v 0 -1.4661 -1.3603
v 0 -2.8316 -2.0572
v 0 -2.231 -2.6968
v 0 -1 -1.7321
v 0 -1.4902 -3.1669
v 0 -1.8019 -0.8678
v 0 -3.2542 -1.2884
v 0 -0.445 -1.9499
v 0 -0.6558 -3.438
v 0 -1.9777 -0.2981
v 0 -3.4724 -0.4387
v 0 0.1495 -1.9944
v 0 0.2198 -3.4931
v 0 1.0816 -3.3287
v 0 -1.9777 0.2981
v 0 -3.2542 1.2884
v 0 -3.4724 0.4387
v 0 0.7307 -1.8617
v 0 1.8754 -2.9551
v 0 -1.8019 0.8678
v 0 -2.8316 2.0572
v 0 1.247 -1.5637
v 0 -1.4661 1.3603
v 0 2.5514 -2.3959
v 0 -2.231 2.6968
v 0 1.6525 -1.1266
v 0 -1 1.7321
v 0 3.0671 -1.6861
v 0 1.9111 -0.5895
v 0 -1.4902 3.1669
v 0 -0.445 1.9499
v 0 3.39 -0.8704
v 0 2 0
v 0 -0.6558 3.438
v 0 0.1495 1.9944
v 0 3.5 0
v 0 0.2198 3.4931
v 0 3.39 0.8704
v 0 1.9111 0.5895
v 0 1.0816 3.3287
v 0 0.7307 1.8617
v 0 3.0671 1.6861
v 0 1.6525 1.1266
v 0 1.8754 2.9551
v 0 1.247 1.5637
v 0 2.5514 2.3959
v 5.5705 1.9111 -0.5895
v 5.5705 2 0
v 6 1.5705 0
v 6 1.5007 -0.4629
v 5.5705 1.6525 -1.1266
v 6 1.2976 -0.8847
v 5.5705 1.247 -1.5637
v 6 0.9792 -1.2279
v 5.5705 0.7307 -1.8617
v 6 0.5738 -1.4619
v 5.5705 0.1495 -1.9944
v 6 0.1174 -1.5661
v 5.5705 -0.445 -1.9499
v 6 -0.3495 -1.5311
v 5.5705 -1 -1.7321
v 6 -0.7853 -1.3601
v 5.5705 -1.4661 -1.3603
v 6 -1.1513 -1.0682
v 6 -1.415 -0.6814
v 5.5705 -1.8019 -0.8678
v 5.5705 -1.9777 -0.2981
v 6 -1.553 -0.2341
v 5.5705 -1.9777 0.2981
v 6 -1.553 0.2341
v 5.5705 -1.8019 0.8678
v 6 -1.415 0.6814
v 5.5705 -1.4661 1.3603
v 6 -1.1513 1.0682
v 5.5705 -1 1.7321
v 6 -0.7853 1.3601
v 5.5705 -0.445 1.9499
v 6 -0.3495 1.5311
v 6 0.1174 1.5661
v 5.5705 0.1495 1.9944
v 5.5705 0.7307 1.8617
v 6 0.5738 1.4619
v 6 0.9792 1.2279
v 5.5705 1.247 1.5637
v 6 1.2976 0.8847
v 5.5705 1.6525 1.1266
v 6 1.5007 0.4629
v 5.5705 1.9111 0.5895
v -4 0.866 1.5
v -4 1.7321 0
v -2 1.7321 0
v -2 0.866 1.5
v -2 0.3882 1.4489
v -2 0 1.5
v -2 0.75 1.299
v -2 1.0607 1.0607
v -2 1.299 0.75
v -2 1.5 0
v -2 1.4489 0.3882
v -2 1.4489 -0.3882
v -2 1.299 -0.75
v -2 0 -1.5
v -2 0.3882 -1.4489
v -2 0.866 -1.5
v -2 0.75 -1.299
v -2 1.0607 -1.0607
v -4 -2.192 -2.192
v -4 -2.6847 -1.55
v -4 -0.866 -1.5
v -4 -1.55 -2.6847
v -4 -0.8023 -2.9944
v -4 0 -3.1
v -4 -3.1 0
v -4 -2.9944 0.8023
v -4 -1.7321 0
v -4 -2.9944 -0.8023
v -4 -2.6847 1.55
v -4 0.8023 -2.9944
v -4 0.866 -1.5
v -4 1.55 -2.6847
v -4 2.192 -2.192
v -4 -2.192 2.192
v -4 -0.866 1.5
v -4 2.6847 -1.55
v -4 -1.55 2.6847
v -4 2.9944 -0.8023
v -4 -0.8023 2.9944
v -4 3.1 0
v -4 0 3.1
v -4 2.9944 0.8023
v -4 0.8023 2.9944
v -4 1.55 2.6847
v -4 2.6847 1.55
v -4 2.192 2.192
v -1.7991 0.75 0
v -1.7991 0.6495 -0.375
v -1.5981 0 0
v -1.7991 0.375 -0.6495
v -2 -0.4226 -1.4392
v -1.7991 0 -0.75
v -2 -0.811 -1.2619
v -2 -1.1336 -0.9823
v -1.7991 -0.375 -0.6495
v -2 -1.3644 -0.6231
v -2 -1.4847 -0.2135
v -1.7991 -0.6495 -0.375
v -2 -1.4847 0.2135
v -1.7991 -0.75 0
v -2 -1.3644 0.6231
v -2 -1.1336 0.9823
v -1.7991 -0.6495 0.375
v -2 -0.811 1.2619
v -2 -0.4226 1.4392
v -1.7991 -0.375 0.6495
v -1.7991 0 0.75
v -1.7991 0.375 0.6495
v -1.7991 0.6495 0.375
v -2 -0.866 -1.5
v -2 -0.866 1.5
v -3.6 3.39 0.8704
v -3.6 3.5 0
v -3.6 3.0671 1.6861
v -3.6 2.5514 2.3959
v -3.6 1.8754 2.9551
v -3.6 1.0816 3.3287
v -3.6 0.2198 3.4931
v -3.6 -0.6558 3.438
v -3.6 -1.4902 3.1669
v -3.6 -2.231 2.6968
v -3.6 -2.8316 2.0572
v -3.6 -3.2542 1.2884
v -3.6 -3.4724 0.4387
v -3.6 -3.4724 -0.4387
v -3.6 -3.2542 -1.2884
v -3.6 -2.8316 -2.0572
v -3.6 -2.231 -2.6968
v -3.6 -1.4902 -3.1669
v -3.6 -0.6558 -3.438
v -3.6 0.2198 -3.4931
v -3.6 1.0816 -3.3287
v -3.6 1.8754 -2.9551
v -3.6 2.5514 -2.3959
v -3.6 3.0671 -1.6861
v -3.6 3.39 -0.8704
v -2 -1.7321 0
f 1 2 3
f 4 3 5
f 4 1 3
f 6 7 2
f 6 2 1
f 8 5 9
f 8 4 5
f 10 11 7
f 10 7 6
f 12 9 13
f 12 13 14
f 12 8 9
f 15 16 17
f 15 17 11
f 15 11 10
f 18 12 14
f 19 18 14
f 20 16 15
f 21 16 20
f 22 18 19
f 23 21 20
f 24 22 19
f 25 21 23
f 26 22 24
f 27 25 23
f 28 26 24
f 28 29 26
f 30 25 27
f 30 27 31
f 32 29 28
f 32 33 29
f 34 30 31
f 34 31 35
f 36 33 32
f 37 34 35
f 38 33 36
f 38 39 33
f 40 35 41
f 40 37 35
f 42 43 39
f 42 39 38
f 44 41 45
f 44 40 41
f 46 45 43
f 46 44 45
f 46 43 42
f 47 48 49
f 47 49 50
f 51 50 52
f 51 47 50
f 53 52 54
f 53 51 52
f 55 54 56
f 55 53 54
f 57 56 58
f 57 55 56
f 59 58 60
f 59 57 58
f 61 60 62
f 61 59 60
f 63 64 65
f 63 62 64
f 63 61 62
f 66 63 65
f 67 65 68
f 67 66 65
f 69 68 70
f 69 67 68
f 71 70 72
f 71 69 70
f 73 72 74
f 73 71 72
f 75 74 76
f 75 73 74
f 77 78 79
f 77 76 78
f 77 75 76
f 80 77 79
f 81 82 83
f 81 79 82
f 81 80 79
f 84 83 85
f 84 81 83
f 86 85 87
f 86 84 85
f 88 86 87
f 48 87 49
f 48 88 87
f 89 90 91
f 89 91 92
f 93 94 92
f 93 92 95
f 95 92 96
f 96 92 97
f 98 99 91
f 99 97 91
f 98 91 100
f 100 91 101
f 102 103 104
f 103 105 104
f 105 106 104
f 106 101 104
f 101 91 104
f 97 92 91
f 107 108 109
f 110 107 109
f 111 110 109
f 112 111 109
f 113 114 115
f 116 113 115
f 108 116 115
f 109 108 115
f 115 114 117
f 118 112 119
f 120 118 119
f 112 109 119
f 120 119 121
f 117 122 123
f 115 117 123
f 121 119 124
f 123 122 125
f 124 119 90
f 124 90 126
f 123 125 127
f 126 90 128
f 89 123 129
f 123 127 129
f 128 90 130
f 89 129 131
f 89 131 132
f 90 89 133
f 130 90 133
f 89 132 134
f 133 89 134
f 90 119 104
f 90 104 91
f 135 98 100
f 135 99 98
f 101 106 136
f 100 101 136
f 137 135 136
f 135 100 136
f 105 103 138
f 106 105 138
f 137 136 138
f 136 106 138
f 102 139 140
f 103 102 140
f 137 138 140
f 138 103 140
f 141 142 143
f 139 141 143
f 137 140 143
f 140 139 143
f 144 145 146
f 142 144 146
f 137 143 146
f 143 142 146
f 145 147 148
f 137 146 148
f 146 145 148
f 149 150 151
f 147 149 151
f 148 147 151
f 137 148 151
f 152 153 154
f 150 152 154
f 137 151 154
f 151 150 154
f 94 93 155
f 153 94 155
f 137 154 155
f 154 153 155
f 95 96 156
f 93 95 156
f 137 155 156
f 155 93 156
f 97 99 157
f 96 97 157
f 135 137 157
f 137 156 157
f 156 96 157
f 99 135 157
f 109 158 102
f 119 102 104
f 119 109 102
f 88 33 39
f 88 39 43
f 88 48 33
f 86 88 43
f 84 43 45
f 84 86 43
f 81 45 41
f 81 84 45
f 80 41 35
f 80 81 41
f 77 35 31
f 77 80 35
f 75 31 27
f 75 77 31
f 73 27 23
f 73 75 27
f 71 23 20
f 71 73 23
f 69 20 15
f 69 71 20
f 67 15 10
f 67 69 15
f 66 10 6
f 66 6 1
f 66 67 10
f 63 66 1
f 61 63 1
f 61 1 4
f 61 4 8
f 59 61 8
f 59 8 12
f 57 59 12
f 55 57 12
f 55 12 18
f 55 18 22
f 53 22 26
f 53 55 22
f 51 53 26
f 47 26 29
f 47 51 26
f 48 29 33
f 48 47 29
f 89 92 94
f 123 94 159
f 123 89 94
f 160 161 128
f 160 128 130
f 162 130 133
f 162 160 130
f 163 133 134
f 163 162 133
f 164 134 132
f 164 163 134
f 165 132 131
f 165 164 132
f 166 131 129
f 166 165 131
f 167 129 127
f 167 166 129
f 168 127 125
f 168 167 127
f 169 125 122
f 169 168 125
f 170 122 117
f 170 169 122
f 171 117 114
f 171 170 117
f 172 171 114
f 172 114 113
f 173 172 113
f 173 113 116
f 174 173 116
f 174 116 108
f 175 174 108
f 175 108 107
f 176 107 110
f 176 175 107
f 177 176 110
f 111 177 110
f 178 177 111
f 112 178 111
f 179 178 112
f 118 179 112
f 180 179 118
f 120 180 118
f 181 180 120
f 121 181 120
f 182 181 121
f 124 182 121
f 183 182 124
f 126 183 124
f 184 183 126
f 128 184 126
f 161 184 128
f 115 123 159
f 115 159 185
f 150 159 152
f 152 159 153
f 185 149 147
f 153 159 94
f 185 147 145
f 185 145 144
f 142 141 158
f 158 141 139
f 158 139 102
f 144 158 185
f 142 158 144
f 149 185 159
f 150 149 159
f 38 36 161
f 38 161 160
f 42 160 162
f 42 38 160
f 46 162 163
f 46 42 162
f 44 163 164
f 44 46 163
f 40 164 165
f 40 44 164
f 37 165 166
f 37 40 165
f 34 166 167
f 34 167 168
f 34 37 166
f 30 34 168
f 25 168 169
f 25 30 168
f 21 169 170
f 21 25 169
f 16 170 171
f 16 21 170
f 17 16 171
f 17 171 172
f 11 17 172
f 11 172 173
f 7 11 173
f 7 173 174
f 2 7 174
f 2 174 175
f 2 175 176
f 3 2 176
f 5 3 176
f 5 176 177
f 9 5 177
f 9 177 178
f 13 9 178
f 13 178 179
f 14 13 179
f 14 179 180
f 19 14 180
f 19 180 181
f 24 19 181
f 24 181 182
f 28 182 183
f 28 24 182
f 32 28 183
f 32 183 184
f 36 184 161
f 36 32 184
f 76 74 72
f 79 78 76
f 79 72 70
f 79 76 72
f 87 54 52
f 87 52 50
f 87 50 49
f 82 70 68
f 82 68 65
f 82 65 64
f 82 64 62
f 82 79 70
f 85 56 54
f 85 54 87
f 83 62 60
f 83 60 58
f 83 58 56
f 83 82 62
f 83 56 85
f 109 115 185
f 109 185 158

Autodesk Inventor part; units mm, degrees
sketch "Sketch_1" plane through (0, 0, 0) normal (0, 0, 1) x (1, 0, 0)
  line L0 (6, 0) -> (-4, 0)
  line L1 (-4, 0) -> (-4, 3.1)
  line L2 (-4, 3.1) -> (-3.6, 3.5)
  line L3 (-3.6, 3.5) -> (0, 3.5)
  line L4 (0, 3.5) -> (0, 2)
  line L5 (0, 2) -> (5.5705, 2)
  line L6 (5.5705, 2) -> (6, 1.5705)
  line L7 (6, 1.5705) -> (6, 0)
  line L8 (6, 0) -> (-4, 0)
revolve "Revolution1" add sketch "Sketch_1" angle 360 about axis through (6, 0, 0) along (1, 0, 0)
thread "Thread1" size "M4x0.7" class "6g" standard "ISO Metric profile" length 5.3 offset 0.7
sketch "Sketch_4" plane through (0, 0, 0) normal (0, 0, 1) x (1, 0, 0)
  line L0 (-1.5981, 0) -> (-4, 0)
  line L1 (-4, 0) -> (-4, 1.5)
  line L2 (-4, 1.5) -> (-2, 1.5)
  line L3 (-2, 1.5) -> (-1.5981, 0)
  line L4 (-1.5981, 0) -> (-4, 0)
revolve "Revolution2" cut sketch "Sketch_4" angle 360 about axis through (-1.5981, 0, 0) along (1, 0, 0)
sketch "Sketch_3" plane through (-4, 0, 0) normal (1, 0, 0) x (0, 0, -1)
  line L0 (-1.5, 0.866) -> (-1.5, -0.866)
  line L1 (-1.5, -0.866) -> (0, -1.7321)
  line L2 (0, -1.7321) -> (1.5, -0.866)
  line L3 (1.5, -0.866) -> (1.5, 0.866)
  line L4 (1.5, 0.866) -> (0, 1.7321)
  line L5 (0, 1.7321) -> (-1.5, 0.866)
extrude "Extrusion1" cut sketch "Sketch_3" along normal blind 2
ref_plane "nut_XY" through (6, 0, 0) normal (1, 0, 0) x (0, 0, -1)
ref_plane "nut_YZ" through (6, 0, 0) normal (0, 0, -1) x (0, 1, 0)
ref_plane "nut_ZX" through (6, 0, 0) normal (0, 1, 0) x (1, 0, 0)
ref_plane "bolt_XY" through (0, 0, 0) normal (1, 0, 0) x (0, 0, -1)
ref_plane "bolt_YZ" through (0, 0, 0) normal (0, 0, -1) x (0, 1, 0)
ref_plane "bolt_ZX" through (0, 0, 0) normal (0, 1, 0) x (1, 0, 0)
properties part number "SCB4-6_1"
